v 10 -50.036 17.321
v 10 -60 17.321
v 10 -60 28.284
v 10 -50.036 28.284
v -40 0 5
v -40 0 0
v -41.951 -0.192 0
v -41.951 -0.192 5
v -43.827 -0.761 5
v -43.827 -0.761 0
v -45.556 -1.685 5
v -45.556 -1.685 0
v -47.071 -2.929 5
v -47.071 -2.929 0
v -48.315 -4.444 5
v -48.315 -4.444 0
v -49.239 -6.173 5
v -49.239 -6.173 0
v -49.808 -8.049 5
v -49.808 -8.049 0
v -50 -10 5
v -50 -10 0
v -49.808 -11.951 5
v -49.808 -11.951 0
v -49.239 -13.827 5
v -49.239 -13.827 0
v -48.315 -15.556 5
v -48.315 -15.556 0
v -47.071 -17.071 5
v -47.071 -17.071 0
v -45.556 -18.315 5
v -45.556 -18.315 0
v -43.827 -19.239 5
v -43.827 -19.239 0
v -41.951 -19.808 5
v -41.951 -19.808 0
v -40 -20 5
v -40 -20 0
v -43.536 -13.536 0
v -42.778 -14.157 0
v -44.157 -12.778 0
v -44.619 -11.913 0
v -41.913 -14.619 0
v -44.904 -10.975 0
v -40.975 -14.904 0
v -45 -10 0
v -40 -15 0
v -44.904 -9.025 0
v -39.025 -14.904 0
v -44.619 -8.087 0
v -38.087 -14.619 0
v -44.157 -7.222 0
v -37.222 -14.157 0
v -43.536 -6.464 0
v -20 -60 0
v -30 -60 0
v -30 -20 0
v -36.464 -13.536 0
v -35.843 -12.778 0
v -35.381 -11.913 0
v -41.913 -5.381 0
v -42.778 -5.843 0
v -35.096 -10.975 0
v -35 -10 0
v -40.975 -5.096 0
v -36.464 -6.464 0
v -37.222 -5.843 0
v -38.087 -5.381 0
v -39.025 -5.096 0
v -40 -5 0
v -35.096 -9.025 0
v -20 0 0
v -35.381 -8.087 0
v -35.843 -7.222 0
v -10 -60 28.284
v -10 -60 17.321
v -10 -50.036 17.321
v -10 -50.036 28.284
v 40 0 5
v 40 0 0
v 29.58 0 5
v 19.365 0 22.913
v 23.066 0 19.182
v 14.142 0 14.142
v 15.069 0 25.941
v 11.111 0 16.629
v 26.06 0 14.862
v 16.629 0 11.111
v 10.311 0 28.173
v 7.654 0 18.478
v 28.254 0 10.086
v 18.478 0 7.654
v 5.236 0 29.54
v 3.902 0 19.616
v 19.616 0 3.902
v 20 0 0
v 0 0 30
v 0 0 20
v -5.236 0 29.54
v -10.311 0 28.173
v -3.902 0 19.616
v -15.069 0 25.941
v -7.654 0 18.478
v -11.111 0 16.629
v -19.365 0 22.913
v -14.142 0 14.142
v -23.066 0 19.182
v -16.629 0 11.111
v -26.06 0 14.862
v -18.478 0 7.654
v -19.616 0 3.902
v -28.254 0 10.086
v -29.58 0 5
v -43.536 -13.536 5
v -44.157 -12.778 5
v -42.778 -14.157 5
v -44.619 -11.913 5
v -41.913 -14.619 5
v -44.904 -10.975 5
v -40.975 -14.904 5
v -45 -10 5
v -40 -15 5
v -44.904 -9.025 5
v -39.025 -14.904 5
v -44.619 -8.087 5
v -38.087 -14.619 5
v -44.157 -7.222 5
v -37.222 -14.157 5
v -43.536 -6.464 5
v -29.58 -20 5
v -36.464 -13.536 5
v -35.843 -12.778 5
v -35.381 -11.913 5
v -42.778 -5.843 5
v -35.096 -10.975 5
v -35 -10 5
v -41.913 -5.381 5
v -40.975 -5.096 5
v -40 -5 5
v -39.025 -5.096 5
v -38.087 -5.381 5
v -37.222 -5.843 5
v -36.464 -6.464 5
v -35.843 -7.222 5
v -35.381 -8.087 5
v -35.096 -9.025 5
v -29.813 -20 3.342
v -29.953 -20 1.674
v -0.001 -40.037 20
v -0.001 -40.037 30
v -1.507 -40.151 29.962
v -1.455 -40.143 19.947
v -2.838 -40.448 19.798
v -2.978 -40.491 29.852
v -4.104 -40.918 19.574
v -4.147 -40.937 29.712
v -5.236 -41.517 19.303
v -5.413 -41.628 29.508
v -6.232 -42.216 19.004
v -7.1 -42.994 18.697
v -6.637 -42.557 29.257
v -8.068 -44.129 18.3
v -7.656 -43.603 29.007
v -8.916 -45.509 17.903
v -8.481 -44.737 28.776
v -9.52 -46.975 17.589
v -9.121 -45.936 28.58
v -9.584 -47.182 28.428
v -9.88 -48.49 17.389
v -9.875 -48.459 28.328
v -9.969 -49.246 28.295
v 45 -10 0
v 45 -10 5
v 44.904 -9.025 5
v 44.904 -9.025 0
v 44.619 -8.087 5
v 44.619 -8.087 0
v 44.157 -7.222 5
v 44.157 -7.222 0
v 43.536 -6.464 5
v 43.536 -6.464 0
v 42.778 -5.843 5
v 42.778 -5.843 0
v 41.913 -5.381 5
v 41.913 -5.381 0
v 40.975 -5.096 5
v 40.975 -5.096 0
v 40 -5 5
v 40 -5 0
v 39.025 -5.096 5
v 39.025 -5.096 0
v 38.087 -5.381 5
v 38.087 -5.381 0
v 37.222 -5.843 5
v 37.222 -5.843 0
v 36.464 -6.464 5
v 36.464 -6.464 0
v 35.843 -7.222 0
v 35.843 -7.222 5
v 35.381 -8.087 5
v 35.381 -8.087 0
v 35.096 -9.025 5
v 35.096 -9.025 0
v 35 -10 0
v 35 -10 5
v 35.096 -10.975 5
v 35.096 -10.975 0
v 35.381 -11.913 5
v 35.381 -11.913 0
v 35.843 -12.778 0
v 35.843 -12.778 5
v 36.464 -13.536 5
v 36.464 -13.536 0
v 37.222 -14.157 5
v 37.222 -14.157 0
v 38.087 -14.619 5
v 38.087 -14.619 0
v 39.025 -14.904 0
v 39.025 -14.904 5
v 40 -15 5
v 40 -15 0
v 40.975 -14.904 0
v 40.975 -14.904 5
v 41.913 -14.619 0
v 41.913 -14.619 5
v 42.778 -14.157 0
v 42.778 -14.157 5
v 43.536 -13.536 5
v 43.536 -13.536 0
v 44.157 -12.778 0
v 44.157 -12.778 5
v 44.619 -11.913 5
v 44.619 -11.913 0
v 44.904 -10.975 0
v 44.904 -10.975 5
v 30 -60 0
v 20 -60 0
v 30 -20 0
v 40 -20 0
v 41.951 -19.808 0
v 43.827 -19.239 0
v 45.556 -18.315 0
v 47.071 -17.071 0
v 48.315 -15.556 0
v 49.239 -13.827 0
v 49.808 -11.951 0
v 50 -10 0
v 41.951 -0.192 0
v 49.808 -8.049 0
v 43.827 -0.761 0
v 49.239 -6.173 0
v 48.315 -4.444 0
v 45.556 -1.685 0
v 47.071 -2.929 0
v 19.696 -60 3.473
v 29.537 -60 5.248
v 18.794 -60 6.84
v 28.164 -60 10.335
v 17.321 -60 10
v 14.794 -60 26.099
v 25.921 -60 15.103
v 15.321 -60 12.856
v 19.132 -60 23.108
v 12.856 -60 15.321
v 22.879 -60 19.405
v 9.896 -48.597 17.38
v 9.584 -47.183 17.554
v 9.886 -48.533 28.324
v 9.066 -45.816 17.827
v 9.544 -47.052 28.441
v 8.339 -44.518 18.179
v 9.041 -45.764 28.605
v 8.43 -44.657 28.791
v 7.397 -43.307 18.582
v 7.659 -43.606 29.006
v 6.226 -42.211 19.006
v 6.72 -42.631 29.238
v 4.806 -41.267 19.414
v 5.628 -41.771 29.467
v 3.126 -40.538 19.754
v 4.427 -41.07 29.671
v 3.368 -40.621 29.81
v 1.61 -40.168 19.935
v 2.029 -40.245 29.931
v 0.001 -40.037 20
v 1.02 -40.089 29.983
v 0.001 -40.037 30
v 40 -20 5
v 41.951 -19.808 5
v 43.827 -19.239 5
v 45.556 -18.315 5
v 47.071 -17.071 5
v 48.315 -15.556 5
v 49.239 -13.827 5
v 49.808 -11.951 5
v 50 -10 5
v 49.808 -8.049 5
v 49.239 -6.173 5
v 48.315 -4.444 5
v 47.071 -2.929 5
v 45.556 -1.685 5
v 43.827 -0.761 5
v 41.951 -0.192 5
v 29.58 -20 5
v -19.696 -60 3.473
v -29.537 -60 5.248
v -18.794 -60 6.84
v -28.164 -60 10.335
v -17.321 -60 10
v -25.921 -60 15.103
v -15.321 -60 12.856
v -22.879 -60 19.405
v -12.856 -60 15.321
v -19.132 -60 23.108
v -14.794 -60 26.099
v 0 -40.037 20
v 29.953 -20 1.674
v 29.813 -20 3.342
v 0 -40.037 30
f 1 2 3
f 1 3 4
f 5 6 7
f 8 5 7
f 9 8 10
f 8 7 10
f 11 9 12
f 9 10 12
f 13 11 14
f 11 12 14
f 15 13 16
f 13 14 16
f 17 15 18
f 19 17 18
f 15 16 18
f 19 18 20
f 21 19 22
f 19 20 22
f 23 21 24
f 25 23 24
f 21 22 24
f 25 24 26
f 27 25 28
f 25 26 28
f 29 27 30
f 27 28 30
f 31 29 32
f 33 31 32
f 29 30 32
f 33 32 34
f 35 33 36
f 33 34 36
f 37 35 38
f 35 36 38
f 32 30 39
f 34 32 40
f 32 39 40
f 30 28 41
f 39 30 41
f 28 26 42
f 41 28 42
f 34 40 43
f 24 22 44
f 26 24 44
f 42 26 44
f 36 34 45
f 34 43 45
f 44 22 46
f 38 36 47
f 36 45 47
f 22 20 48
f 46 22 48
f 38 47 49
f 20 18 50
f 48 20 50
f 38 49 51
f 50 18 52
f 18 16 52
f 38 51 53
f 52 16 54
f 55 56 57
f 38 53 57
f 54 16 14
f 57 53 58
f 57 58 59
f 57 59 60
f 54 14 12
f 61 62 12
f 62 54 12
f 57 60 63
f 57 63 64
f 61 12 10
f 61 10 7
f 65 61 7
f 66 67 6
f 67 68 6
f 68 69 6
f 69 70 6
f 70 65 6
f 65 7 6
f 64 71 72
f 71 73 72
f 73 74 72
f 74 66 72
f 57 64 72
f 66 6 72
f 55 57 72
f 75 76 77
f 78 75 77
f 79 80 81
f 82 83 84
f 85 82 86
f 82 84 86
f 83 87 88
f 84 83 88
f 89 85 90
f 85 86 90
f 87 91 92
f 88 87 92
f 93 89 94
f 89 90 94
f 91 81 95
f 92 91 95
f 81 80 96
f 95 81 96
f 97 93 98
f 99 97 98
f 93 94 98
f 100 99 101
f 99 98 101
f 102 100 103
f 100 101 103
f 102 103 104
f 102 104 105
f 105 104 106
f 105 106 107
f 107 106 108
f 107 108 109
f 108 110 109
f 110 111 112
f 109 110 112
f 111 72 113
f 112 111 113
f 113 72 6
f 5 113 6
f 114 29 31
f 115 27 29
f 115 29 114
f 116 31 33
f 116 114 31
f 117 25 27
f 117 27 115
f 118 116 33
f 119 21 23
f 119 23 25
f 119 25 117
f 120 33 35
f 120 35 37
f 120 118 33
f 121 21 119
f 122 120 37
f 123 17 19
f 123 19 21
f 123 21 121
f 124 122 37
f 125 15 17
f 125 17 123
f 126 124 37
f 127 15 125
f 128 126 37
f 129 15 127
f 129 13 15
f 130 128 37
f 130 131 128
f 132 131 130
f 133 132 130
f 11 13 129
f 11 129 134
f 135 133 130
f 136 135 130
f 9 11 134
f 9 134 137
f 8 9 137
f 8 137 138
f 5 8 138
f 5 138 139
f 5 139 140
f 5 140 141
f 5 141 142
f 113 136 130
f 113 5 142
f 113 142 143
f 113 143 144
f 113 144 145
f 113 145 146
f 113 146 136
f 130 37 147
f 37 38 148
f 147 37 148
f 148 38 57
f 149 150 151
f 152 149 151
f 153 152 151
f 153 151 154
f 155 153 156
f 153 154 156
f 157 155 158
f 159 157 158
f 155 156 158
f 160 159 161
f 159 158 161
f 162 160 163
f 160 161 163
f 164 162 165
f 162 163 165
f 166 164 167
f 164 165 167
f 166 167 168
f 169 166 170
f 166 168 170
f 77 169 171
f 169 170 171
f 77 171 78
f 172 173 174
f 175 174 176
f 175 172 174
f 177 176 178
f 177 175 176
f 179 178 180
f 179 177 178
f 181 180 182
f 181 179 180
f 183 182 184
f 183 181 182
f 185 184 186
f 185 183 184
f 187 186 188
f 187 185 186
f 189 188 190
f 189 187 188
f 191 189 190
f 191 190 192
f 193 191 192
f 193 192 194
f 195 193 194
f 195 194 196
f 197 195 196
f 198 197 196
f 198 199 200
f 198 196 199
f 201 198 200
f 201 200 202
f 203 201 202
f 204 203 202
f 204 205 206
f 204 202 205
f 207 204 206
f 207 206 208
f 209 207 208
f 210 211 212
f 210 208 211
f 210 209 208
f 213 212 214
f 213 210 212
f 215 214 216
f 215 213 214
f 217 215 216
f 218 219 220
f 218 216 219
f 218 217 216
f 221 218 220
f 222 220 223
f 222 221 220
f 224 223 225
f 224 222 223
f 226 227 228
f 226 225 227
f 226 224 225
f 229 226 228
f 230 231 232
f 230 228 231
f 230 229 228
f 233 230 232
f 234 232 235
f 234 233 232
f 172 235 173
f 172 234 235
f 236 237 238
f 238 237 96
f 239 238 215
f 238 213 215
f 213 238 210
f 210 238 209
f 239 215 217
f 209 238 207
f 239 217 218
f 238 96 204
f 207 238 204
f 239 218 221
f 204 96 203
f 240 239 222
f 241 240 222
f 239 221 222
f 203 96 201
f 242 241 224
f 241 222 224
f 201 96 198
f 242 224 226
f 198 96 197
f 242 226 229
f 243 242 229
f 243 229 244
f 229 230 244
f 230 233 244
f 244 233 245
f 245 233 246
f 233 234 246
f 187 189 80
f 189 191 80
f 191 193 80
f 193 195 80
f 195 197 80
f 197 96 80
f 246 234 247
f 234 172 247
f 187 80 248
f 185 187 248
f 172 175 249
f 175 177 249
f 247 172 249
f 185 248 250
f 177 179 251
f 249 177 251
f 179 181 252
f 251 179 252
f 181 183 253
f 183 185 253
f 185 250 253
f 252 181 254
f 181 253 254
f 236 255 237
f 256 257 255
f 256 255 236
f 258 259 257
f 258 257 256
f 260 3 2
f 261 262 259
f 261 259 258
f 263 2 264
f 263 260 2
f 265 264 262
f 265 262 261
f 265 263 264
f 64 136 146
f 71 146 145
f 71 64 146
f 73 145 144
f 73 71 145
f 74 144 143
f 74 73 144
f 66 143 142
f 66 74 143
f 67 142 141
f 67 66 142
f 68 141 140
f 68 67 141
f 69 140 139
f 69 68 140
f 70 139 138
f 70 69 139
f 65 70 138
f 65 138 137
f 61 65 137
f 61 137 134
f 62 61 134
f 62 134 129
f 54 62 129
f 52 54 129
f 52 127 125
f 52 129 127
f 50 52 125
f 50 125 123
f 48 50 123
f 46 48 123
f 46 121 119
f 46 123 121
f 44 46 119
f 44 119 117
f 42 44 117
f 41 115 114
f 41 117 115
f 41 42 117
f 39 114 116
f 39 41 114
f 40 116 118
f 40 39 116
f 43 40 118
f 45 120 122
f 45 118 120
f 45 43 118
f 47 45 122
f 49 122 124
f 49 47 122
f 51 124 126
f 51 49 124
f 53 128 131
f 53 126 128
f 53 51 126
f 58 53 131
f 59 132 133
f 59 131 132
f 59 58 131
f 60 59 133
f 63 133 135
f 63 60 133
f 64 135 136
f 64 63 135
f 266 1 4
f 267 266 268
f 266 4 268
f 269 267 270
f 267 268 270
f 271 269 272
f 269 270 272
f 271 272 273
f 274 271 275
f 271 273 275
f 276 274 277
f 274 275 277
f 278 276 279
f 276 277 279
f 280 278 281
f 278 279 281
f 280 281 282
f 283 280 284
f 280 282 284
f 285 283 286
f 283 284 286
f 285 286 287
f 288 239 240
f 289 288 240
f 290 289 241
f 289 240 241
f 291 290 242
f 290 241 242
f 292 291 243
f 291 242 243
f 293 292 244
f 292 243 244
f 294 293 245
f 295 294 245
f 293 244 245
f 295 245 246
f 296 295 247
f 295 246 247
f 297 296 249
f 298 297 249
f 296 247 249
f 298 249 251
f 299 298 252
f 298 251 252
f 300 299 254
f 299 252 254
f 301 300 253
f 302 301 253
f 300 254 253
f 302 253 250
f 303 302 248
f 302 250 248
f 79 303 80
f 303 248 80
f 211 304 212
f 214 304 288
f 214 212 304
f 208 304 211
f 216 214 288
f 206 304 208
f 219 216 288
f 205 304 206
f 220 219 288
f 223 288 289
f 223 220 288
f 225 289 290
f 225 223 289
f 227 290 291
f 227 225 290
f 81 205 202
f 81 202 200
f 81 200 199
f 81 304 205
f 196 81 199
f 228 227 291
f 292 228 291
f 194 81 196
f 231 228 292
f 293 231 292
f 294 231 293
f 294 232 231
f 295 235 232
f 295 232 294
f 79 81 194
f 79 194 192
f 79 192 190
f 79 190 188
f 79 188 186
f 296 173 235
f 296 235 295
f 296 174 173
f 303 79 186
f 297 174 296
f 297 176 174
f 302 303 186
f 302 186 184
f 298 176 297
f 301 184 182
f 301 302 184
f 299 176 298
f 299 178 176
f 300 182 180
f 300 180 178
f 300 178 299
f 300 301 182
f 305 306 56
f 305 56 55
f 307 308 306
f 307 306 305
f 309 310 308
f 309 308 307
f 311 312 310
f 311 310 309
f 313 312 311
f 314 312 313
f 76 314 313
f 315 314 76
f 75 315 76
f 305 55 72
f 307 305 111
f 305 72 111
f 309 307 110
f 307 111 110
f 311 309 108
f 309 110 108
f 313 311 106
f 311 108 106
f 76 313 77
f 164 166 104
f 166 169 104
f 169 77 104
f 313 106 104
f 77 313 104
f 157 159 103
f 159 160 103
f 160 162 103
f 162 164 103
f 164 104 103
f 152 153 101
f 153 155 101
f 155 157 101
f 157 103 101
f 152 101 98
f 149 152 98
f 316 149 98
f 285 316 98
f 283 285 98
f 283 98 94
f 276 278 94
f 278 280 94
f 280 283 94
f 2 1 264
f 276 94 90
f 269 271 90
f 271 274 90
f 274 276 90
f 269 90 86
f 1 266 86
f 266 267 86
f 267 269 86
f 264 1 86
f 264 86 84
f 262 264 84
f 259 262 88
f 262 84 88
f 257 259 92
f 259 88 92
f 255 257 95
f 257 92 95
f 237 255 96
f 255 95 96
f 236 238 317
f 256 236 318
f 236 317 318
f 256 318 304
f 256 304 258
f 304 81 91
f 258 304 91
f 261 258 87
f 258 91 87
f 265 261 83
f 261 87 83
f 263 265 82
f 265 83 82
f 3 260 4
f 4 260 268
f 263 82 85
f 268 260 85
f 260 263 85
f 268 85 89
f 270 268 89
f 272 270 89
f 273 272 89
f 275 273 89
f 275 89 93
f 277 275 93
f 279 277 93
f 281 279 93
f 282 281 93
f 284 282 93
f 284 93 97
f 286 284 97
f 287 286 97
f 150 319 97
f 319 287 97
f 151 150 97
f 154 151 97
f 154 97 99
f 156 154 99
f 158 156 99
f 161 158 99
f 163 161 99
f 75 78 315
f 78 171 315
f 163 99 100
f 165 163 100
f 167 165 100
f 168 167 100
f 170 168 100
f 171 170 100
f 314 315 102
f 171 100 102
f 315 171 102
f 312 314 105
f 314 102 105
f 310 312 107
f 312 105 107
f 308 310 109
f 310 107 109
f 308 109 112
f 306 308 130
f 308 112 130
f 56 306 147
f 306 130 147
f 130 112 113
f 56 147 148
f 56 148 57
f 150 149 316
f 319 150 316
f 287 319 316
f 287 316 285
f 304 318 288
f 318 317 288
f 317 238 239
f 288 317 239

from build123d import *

# Parameters (mm, degrees)
F1_DEPTH  = 60
F3_DEPTH  = 5
F4_R      = 5
F5_DEPTH  = 30.001
F6_W      = 20
F6_H      = 20
F7_DEPTH  = 30.001
F8_R      = 9.999
F10_DEPTH = 60.0010001


# Not quite as in the source:
# - a fillet or chamfer is up to 0.001 mm smaller than in the source, because OpenCascade refuses the exact size


with BuildPart() as f1:
    # F0 (on Front) → F1 (new body)
    with BuildSketch(Plane.XZ):
        with BuildLine():
            Line((-30, 0), (30, 0))
            ThreePointArc((30, 0), (0, 30), (-30, 0))
        make_face()
    extrude(amount=F1_DEPTH)

    # F2 (on Top) → F3 (join)
    with BuildSketch(Plane.XY):
        with BuildLine():
            Line((40, 0), (-40, 0))
            ThreePointArc((-40, 0), (-50, -10), (-40, -20))
            Line((-40, -20), (40, -20))
            ThreePointArc((40, -20), (50, -10), (40, 0))
        make_face()
    extrude(amount=F3_DEPTH)

    # F4 (on Top) → F5 (cut, through all)
    with BuildSketch(Plane.XY):
        with Locations((-40, -10)):
            Circle(F4_R)
        with Locations((40, -10)):
            Circle(F4_R)
    extrude(amount=F5_DEPTH, mode=Mode.SUBTRACT)

    # F6 (on Top) → F7 (cut, through all)
    with BuildSketch(Plane.XY):
        with Locations((0, -50.0372105837)):
            Rectangle(F6_W, F6_H)
    extrude(amount=F7_DEPTH, mode=Mode.SUBTRACT)

    # F8 (radius 10 in the source; OpenCascade refuses exactly that, so slightly less here)
    f8_edges = [f1.edges().sort_by_distance(p)[0] for p in [
        (-10, -40.037211, 14.142136),
        (10, -40.037211, 14.142136),
    ]]
    fillet(f8_edges, radius=F8_R)

    # F9 (on face) → F10 (cut, through all)
    with BuildSketch(Plane(origin=(0, 0, 0), x_dir=(-1, 0, 0), z_dir=(0, 1, 0))):
        with BuildLine():
            Line((-20, 0), (20, 0))
            ThreePointArc((20, 0), (0, 20), (-20, 0))
        make_face()
    extrude(amount=-F10_DEPTH, mode=Mode.SUBTRACT)


solid = f1.part
